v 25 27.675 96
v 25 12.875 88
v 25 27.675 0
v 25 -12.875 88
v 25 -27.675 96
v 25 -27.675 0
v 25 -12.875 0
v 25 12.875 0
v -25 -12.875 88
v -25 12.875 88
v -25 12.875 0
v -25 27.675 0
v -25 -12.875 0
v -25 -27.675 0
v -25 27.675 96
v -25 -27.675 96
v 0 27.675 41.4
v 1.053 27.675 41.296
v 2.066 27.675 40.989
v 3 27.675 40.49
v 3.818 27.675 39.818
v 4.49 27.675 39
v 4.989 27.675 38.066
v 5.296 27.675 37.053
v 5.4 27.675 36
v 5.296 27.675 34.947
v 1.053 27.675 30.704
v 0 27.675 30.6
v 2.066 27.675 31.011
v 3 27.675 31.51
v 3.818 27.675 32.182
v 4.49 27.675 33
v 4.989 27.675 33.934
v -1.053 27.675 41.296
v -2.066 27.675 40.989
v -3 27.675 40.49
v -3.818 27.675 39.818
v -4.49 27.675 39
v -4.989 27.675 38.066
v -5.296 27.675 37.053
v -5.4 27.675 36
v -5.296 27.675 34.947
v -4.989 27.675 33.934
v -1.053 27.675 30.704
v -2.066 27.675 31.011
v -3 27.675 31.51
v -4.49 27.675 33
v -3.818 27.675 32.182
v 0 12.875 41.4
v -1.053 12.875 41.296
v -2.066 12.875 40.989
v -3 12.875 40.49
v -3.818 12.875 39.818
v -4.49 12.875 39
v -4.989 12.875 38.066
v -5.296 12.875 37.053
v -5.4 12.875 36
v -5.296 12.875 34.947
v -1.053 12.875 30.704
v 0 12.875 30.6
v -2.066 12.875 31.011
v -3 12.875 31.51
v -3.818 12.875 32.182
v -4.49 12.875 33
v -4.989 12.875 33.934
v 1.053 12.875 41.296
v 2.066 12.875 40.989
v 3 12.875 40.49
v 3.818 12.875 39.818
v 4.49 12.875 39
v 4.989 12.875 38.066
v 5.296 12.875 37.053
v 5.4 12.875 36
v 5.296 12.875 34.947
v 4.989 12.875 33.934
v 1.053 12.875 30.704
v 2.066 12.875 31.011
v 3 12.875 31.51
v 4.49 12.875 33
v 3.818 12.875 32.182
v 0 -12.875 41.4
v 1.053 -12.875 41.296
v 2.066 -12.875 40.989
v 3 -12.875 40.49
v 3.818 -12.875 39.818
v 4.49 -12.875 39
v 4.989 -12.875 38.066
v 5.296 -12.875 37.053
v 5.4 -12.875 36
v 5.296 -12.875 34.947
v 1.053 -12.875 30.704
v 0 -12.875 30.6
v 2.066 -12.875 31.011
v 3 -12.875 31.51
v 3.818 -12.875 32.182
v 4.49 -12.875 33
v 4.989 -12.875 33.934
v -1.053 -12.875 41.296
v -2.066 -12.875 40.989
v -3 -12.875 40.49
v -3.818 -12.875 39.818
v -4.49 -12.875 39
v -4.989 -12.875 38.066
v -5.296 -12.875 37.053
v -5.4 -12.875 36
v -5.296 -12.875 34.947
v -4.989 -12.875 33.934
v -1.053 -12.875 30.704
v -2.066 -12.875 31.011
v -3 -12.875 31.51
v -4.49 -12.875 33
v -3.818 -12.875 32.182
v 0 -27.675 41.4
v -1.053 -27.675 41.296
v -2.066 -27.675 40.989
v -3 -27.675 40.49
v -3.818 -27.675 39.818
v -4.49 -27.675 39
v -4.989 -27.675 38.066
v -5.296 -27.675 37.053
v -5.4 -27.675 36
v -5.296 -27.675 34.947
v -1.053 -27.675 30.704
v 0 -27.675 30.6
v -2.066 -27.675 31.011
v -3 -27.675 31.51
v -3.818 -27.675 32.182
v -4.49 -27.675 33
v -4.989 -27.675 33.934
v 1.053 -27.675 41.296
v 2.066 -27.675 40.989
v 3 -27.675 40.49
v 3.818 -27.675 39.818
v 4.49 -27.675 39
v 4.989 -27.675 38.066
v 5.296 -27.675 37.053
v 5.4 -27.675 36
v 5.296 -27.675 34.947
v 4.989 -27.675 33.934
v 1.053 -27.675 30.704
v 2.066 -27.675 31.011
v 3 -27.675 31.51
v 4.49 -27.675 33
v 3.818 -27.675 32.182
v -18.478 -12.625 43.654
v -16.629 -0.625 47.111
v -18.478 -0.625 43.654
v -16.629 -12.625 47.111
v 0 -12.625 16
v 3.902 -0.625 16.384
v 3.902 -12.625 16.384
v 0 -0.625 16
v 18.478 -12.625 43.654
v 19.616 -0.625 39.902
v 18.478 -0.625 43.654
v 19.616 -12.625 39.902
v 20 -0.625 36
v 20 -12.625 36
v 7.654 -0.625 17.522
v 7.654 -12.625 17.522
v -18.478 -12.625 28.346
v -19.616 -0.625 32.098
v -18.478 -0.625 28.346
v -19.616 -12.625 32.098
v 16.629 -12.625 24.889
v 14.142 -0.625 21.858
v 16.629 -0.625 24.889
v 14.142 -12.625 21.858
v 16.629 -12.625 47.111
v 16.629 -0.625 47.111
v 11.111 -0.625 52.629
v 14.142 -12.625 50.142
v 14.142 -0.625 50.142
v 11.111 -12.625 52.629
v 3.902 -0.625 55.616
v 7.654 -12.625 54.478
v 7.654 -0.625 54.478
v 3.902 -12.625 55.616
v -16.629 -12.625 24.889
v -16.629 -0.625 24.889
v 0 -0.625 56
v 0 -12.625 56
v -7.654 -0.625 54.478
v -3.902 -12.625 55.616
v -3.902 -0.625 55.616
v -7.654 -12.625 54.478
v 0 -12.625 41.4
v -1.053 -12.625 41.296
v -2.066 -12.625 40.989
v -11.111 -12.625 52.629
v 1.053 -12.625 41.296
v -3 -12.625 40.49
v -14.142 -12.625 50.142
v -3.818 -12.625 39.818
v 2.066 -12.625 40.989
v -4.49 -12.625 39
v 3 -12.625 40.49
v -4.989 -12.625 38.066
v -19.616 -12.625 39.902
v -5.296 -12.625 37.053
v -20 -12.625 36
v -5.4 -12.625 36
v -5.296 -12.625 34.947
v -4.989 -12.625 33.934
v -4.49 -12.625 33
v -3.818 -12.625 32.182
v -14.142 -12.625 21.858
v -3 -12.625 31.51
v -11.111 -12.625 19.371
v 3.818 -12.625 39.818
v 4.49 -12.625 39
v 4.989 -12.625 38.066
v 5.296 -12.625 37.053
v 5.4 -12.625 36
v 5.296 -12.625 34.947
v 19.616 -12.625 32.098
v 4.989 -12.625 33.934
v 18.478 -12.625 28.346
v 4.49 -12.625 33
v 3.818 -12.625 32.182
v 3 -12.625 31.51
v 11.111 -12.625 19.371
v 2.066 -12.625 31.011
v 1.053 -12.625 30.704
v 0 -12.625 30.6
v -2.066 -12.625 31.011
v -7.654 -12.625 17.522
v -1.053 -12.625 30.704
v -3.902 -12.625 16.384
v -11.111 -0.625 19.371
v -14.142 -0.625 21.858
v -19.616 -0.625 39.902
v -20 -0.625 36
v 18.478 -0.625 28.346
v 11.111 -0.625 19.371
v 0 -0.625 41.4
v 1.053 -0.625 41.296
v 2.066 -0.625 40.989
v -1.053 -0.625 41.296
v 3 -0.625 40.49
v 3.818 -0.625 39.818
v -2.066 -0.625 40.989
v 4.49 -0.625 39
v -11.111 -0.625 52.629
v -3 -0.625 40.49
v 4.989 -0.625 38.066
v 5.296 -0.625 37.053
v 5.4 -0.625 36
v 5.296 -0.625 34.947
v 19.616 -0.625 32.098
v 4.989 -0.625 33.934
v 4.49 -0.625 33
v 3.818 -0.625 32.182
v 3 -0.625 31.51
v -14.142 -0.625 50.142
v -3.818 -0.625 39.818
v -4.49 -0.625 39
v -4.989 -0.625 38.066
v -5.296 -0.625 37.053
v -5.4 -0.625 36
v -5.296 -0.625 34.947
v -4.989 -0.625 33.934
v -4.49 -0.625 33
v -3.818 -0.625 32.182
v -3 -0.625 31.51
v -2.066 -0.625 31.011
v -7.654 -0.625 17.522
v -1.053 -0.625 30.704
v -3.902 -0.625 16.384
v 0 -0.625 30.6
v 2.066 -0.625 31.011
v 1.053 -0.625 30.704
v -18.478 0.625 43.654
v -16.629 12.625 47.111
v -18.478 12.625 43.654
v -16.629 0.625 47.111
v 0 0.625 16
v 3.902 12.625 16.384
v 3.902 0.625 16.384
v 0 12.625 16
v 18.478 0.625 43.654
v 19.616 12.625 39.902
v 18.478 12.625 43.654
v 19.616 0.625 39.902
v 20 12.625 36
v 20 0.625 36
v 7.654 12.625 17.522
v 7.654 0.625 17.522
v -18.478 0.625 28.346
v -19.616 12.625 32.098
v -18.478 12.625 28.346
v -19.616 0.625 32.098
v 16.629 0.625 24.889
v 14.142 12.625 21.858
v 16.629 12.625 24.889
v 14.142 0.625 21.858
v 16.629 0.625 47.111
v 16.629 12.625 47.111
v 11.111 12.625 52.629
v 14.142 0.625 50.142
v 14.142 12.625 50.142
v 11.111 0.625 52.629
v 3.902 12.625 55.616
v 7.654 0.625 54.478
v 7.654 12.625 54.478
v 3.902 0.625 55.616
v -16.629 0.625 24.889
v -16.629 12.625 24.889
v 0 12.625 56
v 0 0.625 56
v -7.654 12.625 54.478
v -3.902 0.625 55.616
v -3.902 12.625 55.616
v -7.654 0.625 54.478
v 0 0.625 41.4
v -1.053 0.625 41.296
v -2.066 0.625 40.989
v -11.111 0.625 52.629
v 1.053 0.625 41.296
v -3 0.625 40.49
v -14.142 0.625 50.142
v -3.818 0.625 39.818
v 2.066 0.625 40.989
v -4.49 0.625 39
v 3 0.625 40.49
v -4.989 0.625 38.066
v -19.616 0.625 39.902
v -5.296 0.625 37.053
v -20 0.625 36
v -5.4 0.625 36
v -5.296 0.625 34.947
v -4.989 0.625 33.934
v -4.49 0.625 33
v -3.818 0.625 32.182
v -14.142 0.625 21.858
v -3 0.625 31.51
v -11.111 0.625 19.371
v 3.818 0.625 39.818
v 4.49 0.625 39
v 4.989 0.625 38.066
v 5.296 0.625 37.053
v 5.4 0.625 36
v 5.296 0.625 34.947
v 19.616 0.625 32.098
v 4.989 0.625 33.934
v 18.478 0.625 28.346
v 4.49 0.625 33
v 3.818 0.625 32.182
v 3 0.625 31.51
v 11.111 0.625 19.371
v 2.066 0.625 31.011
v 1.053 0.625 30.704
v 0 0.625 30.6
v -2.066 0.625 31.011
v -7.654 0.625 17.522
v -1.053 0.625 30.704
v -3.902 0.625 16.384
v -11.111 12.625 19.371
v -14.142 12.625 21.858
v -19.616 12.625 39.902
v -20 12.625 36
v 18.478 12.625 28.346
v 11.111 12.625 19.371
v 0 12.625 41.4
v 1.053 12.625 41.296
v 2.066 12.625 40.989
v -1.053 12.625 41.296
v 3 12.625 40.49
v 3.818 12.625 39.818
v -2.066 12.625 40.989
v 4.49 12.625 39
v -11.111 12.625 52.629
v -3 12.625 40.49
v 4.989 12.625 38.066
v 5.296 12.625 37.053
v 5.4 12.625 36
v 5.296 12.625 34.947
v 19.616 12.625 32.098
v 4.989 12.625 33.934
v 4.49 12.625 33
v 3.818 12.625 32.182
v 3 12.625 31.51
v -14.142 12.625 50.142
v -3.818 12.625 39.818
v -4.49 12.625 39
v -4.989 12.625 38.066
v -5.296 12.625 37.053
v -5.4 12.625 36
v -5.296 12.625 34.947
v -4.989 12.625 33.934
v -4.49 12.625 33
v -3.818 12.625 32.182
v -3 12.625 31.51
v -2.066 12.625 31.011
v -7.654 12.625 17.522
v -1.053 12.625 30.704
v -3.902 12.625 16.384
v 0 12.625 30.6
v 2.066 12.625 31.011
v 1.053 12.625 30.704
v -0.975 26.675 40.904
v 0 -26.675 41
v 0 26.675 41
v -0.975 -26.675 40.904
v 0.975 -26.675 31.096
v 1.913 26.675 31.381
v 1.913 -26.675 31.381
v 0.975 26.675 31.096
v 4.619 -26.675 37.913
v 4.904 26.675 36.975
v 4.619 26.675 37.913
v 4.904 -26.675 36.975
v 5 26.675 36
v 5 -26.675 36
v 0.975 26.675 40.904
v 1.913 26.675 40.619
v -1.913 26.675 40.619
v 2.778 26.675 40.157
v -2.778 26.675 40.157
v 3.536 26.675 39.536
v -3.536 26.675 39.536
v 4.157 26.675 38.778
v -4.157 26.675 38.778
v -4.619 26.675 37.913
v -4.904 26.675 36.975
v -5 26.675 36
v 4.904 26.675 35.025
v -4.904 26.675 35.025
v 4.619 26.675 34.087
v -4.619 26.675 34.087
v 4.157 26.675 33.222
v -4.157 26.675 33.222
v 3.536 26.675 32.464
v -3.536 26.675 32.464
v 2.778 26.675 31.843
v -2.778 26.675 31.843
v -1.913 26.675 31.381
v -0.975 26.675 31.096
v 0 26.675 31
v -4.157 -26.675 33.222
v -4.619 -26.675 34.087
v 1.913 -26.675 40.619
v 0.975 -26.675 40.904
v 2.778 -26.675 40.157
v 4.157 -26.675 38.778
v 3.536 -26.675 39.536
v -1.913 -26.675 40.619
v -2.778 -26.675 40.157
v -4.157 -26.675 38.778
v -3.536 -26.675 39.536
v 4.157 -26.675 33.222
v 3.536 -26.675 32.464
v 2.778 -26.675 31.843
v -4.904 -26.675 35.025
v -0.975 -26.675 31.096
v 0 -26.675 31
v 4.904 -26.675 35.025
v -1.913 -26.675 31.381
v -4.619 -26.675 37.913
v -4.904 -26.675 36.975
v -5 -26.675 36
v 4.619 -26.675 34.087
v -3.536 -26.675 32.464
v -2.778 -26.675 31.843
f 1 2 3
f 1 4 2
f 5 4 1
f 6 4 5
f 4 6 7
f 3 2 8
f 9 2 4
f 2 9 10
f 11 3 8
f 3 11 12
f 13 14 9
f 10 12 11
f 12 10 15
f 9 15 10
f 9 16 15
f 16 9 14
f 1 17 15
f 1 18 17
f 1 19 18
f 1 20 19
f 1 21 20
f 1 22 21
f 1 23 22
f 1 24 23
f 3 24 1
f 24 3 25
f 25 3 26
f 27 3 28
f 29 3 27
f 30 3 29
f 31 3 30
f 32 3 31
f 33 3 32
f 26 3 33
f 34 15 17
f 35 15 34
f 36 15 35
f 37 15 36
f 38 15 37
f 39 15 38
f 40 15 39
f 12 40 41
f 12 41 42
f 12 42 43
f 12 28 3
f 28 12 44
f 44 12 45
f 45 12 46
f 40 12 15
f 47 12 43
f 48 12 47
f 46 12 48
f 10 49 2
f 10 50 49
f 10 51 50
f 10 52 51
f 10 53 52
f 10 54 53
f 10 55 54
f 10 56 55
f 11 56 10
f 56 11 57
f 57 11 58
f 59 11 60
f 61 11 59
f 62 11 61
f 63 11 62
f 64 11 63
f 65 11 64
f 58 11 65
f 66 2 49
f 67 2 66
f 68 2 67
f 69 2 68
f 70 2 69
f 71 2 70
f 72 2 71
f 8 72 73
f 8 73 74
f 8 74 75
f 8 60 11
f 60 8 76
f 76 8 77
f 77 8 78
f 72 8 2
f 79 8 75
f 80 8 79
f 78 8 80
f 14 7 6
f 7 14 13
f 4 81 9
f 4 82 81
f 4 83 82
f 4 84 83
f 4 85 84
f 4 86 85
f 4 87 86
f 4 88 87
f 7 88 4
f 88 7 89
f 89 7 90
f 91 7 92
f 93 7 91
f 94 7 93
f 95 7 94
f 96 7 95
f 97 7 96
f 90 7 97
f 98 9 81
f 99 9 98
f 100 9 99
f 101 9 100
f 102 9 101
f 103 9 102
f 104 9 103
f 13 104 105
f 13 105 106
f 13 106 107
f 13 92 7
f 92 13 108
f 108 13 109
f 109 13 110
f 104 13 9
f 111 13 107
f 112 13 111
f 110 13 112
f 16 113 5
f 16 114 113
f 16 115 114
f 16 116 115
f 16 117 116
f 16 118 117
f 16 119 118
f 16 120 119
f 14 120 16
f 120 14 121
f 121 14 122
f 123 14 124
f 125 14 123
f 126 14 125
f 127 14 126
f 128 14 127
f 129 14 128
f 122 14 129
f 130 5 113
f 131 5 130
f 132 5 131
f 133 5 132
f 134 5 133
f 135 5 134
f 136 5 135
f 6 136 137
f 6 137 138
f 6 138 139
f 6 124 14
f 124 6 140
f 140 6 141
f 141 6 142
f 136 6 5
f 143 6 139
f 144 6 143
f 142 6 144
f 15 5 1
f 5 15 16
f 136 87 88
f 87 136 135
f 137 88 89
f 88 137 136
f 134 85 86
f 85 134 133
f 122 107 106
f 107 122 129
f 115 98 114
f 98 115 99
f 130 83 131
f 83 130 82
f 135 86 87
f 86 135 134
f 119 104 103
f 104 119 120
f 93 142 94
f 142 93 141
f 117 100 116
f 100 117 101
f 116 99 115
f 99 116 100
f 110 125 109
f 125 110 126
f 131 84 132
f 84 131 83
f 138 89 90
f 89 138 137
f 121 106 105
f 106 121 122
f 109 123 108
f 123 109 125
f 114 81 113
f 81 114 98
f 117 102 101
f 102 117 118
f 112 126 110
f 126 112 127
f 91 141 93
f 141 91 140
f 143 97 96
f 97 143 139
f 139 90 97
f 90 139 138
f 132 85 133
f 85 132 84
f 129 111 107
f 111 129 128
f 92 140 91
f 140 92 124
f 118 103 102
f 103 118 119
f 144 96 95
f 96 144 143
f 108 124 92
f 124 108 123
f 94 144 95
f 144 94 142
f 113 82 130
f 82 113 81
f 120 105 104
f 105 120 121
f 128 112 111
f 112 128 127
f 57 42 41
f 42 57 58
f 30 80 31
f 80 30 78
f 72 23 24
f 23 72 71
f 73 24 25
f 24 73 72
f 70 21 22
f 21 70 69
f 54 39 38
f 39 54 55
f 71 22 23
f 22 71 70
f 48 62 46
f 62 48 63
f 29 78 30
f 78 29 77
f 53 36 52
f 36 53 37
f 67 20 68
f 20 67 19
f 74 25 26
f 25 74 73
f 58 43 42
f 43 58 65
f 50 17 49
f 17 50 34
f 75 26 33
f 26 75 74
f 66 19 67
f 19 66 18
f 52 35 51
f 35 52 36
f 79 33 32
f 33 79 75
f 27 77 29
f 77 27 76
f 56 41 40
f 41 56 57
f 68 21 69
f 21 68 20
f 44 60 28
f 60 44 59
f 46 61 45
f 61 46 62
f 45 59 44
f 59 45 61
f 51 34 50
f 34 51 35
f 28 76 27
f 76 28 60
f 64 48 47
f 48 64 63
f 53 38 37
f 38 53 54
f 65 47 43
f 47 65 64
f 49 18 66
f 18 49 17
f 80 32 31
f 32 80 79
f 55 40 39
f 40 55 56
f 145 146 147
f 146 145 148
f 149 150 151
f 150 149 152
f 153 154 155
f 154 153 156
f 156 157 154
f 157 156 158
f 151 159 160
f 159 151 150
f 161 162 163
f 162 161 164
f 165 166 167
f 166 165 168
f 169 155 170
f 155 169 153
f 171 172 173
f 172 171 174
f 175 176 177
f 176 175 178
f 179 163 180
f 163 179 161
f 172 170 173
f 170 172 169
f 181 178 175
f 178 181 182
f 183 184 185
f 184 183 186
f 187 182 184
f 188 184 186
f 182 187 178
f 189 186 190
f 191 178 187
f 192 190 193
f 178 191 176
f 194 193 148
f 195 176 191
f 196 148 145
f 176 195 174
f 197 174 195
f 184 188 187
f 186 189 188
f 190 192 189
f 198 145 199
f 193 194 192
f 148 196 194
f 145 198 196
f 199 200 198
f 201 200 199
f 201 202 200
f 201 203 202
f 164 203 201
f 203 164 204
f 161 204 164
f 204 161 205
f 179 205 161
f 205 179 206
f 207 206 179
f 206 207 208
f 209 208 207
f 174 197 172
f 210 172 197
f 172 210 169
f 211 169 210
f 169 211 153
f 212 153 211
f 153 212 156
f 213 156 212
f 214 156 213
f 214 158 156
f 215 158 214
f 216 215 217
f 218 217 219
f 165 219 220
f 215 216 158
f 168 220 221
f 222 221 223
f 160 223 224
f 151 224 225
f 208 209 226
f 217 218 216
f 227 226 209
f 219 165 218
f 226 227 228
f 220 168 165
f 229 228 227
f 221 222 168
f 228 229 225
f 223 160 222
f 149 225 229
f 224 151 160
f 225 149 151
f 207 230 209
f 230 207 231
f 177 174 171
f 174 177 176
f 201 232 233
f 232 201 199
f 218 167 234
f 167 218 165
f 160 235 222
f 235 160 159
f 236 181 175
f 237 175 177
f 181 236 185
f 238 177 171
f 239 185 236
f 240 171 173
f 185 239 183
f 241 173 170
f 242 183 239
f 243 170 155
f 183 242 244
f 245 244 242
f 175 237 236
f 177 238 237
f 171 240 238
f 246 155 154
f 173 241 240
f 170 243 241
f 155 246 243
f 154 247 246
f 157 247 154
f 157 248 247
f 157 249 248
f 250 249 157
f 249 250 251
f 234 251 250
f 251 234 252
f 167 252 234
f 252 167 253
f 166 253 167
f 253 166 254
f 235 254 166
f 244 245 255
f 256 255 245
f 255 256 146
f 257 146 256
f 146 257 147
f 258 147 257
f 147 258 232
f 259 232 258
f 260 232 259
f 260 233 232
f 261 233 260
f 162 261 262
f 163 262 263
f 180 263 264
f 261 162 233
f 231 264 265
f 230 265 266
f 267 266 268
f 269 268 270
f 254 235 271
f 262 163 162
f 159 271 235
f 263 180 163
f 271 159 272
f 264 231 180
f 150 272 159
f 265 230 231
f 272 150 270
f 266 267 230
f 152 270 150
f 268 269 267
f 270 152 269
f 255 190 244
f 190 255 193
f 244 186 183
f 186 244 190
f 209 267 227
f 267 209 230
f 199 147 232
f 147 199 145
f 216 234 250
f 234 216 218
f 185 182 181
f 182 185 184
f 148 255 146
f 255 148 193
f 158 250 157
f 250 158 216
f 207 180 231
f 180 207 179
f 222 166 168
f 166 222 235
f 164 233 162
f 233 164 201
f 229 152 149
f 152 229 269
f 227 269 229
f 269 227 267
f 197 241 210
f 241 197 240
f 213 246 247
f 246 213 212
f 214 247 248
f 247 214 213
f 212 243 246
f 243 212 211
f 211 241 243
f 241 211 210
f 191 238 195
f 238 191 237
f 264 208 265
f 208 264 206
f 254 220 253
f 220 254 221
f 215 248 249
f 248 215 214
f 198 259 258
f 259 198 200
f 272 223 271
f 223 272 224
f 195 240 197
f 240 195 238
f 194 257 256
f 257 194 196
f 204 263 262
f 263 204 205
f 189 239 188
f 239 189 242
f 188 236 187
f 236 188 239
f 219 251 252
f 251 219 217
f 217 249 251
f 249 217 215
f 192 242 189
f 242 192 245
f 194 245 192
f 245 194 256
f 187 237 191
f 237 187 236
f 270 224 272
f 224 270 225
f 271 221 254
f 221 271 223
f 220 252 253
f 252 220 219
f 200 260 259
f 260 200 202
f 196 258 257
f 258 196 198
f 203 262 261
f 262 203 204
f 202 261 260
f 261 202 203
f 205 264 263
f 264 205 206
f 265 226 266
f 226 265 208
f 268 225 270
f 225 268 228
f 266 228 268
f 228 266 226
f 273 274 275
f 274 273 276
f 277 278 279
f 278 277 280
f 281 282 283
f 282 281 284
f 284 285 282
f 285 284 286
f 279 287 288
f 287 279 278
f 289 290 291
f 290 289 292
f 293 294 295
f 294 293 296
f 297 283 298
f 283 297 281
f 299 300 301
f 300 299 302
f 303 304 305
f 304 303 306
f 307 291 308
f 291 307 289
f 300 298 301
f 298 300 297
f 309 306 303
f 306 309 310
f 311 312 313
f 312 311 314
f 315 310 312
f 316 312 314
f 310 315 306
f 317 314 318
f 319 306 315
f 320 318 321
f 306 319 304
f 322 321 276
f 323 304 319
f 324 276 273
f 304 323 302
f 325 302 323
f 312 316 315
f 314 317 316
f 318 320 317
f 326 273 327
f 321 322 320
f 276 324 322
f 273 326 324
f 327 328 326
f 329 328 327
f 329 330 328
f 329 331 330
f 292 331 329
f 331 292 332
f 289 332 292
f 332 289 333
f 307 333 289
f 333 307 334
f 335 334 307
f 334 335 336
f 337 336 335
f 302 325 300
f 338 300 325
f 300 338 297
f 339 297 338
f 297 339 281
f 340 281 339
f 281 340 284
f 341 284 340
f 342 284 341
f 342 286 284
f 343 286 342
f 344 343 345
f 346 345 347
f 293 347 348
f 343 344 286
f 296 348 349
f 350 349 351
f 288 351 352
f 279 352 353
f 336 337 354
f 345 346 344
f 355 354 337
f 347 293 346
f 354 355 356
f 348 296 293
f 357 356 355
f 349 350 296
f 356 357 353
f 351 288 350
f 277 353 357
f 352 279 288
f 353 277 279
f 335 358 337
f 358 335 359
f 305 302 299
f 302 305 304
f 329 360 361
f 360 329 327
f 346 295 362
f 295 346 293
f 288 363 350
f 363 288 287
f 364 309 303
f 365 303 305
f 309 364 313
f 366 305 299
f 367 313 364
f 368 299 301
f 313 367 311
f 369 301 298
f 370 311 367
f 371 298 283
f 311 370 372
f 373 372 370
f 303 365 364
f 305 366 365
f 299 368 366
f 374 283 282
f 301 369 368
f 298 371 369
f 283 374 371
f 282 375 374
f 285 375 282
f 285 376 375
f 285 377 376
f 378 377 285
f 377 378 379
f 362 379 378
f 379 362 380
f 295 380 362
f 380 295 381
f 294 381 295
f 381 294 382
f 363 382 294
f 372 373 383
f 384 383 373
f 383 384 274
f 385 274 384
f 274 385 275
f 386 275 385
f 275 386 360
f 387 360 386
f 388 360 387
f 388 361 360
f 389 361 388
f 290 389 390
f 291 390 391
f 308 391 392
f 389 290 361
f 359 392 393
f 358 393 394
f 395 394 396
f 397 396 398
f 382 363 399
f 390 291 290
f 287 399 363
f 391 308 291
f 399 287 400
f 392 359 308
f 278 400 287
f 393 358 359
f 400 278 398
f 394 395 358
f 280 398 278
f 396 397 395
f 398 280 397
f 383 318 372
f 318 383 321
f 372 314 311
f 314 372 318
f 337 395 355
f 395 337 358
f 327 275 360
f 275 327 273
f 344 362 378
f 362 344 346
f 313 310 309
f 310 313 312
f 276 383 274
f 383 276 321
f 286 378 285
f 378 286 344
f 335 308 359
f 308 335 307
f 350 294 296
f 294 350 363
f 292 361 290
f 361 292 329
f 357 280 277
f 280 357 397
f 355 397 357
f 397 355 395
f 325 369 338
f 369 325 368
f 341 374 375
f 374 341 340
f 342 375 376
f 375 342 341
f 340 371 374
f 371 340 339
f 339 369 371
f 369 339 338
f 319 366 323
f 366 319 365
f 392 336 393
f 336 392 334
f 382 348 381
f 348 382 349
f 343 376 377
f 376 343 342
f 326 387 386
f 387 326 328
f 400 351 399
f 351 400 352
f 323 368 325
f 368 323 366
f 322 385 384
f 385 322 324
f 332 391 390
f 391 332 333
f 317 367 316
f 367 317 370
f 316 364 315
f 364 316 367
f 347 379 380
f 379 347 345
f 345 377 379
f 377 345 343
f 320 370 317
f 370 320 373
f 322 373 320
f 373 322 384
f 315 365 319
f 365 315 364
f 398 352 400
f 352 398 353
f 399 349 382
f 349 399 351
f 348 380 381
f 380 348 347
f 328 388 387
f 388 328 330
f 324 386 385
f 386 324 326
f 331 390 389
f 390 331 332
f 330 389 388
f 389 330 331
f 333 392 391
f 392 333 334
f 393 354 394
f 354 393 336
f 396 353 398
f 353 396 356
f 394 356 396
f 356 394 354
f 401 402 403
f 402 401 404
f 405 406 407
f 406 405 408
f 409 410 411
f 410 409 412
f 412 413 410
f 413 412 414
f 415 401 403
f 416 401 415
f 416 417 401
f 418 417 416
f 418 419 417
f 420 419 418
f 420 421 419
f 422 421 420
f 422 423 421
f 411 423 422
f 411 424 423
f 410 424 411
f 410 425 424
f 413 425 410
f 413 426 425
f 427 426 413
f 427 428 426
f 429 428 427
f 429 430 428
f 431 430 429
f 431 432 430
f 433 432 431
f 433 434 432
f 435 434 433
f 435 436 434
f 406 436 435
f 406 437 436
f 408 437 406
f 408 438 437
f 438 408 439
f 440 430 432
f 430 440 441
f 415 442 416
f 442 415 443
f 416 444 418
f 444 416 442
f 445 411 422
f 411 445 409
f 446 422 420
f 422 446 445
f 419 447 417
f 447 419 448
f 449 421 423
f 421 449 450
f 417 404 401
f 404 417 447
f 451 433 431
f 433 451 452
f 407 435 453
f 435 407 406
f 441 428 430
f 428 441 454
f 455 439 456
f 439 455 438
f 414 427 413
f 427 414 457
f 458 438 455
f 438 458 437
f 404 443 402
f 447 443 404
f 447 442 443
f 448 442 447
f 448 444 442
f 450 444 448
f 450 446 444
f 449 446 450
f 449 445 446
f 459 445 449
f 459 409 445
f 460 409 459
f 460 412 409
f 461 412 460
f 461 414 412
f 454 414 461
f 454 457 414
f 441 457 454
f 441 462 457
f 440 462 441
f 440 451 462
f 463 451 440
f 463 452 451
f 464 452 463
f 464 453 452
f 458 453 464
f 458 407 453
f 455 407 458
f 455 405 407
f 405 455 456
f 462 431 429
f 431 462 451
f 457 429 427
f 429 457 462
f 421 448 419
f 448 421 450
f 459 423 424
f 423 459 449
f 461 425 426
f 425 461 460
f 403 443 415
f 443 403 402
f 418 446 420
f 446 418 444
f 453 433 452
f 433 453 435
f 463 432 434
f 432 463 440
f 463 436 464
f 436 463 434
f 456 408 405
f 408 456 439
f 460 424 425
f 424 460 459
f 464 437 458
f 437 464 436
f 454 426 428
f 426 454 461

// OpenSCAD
$fn = 32;

// ------------------------------------------------------------------------
// Trolley wheel set: wheels d40, fork 88 mm tall
// Every part is its own module, assembly() places every instance.
// ------------------------------------------------------------------------

// --- part 1 ---
module trolley_fork() {
  difference() {
    union() {
      translate([-25, 12.875, 0]) cube([50, 14.8, 88]);
      translate([-25, -27.675, 0]) cube([50, 14.8, 88]);
      translate([-25, -27.675, 88]) cube([50, 55.35, 8]);
    }
    translate([0, -20.275, 36]) rotate([90, 0, 0]) cylinder(h = 16.8, d = 10.8, center = true);
    translate([0, 20.275, 36]) rotate([90, 0, 0]) cylinder(h = 16.8, d = 10.8, center = true);
  }
}

// --- part 2 ---
module trolley_wheel() {
  difference() {
      translate([0, 0, 0]) cylinder(h = 12, d = 40);
      translate([0, 0, -1]) cylinder(h = 14, d = 10.8);
    }
}

// --- part 3 ---
module trolley_axle() {
  translate([0, 0, -26.675]) cylinder(h = 53.35, d = 10);
}

// --- assembly ---
module assembly() {
  color([0.80, 0.24, 0.20]) translate([0, 0, 0]) rotate([0, 0, 0]) trolley_fork();
  color([0.20, 0.45, 0.75]) translate([0, -0.625, 36]) rotate([90, 0, 0]) trolley_wheel();
  color([0.25, 0.62, 0.32]) translate([0, 12.625, 36]) rotate([90, 0, 0]) trolley_wheel();
  color([0.92, 0.70, 0.18]) translate([0, 0, 36]) rotate([90, 0, 0]) trolley_axle();
}

assembly();
